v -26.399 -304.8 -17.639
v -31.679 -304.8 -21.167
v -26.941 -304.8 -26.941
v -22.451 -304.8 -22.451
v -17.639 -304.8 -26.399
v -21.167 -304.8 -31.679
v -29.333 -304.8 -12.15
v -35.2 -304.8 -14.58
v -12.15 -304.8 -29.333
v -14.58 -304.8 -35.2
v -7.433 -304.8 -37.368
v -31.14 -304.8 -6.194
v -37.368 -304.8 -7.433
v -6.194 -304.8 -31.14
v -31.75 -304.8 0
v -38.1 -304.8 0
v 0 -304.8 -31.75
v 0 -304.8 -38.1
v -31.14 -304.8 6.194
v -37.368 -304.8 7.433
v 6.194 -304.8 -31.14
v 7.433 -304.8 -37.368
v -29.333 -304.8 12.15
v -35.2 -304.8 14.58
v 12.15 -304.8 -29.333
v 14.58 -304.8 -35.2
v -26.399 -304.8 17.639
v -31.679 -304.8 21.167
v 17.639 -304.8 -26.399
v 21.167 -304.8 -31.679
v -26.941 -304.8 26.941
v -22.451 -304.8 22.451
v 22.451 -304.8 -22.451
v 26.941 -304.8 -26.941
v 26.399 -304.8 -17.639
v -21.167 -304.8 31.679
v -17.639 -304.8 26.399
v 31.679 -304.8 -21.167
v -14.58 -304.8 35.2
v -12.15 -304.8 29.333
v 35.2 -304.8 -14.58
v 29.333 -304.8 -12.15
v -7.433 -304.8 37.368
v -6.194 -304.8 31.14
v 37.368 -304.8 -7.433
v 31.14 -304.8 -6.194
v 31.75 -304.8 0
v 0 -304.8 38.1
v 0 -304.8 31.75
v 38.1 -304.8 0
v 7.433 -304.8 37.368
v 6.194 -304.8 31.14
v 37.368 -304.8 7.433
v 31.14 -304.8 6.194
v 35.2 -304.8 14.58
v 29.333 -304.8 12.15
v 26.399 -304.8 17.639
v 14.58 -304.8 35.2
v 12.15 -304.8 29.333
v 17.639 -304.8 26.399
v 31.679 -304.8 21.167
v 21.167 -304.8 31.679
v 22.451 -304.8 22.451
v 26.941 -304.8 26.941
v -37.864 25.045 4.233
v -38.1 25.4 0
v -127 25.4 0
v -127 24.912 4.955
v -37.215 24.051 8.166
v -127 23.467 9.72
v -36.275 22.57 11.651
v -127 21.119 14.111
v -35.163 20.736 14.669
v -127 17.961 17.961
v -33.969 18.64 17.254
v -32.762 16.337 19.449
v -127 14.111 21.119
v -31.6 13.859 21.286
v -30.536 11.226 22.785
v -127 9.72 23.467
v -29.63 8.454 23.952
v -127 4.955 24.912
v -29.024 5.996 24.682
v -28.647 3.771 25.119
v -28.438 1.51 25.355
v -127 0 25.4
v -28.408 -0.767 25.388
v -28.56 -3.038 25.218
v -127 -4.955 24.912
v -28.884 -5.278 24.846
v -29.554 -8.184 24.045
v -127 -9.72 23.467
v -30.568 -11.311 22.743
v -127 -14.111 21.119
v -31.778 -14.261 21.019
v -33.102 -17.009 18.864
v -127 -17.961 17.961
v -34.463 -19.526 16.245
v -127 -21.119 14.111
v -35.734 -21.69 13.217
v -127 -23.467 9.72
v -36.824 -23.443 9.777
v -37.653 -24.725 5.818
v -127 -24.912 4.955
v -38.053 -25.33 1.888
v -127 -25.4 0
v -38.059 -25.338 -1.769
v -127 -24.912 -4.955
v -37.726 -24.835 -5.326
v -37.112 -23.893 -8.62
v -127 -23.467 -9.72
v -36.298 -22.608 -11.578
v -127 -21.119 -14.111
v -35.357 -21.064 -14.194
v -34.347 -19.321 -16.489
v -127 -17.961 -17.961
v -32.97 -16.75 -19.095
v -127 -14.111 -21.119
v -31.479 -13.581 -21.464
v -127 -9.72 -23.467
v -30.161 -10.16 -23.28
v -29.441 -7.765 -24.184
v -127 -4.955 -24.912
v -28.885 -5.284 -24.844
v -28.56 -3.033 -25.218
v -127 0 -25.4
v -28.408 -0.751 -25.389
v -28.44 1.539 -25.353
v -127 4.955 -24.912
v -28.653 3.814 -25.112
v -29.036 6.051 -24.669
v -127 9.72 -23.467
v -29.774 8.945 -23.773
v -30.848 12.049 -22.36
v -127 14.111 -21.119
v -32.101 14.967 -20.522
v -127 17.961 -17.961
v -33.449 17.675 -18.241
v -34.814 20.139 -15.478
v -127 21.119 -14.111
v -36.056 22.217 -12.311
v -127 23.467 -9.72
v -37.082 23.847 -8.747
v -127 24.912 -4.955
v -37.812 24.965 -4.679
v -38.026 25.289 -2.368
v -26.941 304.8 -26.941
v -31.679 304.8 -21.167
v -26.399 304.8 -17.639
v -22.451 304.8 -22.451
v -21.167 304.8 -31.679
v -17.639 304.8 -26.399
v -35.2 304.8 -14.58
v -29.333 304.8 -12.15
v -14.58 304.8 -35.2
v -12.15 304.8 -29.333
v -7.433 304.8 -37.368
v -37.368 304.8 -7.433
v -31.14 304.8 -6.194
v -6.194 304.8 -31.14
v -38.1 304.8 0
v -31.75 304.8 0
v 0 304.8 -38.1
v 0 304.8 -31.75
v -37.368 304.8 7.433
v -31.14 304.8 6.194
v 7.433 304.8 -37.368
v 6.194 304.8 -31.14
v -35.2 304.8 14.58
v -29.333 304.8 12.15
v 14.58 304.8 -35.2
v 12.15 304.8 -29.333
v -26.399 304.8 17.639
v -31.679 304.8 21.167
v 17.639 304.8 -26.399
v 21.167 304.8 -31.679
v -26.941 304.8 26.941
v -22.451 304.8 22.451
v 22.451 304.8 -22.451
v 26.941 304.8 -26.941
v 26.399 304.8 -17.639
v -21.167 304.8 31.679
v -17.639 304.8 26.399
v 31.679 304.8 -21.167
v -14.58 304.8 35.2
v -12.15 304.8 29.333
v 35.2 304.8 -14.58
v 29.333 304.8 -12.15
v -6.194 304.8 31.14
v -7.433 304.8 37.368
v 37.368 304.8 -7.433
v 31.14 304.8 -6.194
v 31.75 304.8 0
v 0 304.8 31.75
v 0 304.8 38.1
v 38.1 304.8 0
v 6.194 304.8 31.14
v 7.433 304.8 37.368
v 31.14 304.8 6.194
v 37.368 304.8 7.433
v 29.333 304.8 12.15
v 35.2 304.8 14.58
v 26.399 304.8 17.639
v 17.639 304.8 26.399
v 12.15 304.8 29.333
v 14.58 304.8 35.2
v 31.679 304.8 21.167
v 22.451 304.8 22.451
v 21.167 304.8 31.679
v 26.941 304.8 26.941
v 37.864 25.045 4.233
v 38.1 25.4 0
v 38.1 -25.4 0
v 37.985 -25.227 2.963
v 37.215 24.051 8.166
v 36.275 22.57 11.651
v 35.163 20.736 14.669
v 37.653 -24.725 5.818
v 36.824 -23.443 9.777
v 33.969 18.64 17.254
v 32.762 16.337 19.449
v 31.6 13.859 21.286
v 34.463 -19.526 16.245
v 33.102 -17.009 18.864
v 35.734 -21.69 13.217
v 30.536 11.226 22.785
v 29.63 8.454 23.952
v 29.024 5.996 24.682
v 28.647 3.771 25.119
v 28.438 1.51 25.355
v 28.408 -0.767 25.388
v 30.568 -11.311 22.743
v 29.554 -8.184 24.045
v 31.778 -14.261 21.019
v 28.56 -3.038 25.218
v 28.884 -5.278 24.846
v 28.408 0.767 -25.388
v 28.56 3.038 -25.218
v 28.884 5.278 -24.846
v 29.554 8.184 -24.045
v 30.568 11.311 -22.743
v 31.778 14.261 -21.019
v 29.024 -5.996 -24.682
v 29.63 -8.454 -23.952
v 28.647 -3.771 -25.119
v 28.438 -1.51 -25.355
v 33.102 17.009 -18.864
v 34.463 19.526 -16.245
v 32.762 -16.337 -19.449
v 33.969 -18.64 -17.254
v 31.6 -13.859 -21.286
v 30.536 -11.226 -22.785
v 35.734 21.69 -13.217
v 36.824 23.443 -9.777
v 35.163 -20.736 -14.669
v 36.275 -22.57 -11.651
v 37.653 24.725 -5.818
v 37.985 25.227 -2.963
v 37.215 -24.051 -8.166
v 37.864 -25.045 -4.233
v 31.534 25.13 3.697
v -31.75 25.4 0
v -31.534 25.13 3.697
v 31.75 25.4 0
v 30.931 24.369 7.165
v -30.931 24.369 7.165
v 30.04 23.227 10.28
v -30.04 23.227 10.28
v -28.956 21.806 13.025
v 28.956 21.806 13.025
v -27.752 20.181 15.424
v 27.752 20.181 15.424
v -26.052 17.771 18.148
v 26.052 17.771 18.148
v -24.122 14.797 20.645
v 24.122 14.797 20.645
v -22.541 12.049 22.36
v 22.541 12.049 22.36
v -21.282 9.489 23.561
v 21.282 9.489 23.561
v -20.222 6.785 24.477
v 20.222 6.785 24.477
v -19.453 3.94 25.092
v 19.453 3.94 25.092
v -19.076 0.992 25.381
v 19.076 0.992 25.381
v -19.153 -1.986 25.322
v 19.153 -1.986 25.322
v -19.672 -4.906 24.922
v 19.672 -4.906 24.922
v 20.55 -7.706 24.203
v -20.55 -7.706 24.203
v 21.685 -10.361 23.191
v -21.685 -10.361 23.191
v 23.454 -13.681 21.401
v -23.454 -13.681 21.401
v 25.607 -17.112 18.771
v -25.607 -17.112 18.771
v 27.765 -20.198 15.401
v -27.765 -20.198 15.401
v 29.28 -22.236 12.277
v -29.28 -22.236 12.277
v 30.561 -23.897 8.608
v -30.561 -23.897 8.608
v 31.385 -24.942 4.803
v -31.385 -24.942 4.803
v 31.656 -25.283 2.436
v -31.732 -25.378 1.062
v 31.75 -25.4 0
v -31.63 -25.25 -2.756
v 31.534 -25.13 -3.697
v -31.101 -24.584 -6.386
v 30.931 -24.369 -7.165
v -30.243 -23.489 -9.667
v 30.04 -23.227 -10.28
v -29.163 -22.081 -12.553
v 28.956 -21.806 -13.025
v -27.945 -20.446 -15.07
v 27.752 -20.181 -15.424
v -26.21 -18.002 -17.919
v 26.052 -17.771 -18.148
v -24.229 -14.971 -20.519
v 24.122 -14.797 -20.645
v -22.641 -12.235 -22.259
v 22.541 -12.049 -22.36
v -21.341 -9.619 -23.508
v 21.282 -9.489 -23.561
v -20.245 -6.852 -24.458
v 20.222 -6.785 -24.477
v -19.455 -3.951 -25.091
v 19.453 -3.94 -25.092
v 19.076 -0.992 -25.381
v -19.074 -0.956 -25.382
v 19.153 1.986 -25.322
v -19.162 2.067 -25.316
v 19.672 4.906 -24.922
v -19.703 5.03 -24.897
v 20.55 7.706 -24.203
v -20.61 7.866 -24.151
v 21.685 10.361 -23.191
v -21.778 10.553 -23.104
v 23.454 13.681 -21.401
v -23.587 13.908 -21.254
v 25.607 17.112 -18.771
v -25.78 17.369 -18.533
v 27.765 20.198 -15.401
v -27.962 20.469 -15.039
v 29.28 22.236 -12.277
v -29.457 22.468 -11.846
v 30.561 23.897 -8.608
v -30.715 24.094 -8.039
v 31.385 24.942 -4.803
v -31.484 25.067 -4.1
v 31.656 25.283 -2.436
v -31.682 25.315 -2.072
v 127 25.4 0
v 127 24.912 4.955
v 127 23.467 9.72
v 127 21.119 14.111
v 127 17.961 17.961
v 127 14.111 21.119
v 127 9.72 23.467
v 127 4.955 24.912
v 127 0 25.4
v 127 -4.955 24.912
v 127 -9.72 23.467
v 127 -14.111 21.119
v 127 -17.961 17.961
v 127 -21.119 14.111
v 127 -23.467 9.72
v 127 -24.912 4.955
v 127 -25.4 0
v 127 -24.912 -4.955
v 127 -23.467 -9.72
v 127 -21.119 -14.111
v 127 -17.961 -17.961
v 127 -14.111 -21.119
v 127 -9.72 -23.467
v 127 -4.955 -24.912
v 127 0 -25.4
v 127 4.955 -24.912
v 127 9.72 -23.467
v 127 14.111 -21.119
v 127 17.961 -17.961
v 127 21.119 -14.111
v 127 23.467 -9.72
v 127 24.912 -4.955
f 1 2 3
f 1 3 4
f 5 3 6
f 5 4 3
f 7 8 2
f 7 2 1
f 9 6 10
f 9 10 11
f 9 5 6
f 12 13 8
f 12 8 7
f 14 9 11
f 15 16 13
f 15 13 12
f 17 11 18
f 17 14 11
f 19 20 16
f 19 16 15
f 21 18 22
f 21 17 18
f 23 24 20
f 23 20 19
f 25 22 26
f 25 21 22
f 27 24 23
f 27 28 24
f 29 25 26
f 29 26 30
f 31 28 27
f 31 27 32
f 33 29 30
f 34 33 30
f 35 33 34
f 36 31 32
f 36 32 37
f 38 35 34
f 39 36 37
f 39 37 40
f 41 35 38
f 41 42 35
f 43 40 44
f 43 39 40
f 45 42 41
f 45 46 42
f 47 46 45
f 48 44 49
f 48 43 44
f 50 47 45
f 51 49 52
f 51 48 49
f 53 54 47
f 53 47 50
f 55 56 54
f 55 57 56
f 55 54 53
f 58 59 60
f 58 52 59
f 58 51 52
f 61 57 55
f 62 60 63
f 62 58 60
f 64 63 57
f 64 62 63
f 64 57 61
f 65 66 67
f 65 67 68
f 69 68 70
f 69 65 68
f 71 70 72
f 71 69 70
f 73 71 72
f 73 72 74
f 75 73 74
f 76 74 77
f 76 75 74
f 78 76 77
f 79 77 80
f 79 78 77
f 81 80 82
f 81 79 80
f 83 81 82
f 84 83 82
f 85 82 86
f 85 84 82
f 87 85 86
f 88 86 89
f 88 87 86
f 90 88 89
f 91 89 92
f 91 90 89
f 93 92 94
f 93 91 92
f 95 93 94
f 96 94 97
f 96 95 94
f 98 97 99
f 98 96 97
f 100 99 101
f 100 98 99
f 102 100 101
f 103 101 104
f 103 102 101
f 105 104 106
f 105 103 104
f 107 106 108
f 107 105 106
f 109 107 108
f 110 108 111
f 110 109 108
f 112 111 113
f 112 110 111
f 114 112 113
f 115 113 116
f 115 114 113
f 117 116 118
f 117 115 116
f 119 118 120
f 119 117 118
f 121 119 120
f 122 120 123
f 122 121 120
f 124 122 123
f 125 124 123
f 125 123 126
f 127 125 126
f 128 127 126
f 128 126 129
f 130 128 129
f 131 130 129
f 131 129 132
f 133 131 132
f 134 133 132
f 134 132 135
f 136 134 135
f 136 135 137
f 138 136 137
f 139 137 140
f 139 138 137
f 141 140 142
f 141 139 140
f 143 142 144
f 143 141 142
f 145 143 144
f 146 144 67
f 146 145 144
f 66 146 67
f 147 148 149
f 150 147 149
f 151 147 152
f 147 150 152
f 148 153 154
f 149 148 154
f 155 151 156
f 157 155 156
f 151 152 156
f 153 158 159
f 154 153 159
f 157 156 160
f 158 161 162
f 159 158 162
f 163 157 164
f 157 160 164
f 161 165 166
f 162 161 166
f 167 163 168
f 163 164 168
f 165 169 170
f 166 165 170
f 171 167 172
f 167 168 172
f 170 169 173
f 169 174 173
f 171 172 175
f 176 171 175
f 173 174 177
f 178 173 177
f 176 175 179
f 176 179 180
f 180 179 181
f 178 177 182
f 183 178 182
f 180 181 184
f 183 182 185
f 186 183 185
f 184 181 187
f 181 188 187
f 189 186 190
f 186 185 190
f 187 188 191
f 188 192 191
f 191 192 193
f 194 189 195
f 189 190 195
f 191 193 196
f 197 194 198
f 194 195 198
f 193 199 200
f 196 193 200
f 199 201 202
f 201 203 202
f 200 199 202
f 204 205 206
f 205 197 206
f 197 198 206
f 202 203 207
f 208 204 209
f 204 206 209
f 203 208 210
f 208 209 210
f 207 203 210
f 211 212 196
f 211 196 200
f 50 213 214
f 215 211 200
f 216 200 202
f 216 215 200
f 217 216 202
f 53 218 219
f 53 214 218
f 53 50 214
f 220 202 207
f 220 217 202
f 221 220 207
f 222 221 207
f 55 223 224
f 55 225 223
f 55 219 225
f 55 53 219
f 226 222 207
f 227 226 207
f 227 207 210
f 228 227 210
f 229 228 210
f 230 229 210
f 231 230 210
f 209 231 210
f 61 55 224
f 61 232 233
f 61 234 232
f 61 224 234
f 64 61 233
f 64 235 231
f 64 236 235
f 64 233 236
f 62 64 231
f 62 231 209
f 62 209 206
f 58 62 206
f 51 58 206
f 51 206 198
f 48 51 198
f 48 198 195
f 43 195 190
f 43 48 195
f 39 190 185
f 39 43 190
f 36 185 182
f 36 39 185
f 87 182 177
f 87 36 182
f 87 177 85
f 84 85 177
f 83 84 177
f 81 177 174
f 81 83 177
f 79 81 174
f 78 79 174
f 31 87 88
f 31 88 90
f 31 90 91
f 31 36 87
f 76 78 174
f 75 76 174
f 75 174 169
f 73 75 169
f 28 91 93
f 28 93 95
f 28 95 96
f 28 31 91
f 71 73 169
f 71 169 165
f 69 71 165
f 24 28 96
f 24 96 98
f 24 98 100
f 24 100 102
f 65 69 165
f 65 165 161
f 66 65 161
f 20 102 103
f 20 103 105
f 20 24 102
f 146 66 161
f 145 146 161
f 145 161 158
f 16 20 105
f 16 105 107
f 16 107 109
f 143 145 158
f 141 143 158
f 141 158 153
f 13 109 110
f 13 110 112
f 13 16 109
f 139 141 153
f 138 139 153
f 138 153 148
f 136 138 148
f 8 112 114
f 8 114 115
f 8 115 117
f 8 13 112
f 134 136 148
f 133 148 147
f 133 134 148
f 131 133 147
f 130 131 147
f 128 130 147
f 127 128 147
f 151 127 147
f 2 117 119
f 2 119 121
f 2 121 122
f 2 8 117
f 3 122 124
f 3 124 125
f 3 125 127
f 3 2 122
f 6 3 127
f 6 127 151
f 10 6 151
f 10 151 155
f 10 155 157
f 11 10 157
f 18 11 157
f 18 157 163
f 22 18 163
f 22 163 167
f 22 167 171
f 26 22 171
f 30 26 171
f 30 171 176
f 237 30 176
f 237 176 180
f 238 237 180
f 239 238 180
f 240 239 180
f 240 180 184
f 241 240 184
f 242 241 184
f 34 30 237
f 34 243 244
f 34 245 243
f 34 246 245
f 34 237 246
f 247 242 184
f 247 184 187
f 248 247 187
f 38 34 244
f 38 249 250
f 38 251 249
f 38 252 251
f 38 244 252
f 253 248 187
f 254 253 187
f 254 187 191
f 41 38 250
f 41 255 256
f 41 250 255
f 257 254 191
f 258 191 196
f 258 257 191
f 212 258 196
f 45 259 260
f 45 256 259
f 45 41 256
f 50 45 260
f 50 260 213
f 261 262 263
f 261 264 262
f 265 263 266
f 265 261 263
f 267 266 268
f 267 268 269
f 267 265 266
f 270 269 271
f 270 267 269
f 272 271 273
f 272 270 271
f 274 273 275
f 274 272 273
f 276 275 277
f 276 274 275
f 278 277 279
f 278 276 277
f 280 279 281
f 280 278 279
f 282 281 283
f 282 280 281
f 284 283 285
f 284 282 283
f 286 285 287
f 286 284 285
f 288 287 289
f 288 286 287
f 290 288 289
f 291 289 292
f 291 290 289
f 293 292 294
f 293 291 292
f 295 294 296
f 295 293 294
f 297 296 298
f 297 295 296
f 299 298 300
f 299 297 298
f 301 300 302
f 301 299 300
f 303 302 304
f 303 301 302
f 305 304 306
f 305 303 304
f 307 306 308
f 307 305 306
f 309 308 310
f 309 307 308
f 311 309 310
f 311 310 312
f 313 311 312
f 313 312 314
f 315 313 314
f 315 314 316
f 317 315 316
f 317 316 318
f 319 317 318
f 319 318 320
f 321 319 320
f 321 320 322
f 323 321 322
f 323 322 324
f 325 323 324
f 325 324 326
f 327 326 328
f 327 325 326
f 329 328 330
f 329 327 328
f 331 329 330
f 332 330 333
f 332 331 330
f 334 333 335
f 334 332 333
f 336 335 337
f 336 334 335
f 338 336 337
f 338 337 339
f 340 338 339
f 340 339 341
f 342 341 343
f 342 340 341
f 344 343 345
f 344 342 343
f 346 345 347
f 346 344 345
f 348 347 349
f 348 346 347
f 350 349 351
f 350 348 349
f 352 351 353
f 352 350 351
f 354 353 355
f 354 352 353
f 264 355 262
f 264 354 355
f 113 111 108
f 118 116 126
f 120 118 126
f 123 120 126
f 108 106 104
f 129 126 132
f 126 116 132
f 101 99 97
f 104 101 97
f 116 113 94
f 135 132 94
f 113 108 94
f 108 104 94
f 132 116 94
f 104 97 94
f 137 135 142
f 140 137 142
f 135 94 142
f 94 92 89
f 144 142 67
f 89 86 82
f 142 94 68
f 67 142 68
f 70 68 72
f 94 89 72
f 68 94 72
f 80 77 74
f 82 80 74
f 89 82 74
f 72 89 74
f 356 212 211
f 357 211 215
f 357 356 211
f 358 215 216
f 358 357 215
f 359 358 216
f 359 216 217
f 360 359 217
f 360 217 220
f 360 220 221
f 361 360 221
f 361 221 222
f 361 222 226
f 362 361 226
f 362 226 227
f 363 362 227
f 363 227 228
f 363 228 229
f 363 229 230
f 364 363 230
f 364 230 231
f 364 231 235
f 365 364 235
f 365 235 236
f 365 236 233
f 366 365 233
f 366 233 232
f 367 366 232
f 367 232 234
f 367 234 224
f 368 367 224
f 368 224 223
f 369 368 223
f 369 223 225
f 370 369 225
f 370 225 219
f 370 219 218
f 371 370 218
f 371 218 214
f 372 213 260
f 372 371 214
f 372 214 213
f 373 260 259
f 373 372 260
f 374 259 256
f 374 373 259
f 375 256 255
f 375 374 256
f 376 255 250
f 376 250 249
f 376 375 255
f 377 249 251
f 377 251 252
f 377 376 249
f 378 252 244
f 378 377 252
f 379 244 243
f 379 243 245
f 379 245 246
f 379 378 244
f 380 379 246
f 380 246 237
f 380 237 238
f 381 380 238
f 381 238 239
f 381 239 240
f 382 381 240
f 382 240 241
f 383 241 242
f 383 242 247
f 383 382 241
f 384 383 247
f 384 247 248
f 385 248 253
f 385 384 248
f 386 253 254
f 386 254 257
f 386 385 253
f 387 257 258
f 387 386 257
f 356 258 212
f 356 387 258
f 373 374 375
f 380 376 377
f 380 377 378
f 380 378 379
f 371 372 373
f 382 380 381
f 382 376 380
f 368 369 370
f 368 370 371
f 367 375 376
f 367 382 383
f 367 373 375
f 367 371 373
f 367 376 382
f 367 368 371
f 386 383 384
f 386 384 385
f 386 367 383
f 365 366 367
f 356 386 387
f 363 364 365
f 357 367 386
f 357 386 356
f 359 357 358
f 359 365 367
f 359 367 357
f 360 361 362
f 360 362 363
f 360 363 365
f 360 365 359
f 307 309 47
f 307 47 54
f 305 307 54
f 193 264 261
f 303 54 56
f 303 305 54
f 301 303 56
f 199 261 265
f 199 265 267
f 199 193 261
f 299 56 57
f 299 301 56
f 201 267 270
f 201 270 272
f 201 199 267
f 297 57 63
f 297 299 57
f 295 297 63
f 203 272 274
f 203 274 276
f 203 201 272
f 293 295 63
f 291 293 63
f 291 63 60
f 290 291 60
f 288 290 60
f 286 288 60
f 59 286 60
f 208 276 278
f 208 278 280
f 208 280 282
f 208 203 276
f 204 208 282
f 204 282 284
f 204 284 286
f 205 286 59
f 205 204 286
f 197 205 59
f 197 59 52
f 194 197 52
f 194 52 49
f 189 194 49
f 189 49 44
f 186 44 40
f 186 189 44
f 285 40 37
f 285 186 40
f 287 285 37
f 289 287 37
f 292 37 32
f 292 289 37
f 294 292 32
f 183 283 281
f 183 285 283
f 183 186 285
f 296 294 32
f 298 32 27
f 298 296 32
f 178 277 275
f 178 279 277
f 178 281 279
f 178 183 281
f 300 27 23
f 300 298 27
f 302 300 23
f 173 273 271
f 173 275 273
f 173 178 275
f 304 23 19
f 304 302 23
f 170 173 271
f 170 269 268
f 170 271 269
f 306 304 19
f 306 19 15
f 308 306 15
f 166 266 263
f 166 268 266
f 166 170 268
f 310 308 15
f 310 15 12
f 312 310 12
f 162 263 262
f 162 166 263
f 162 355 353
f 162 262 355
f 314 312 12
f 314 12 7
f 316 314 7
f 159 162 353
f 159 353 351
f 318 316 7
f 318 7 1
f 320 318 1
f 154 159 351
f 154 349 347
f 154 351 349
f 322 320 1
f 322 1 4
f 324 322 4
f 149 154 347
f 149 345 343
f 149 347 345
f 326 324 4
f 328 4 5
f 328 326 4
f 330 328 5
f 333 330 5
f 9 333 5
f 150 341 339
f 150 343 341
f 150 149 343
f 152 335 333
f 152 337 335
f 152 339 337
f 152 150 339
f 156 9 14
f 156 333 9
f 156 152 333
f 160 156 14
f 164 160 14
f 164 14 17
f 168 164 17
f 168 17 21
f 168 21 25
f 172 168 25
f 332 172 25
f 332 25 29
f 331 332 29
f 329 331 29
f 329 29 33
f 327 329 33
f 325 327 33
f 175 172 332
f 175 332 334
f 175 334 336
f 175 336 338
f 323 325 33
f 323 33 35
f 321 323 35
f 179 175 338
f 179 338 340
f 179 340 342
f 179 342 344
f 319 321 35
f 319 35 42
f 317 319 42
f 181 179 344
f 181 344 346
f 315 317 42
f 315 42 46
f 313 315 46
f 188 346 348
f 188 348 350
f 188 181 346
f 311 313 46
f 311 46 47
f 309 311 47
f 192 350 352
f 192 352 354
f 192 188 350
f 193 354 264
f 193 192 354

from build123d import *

# Parameters (mm, degrees)
F0_R     = 38.1
F0_R_2   = 31.75
F1_DEPTH = 304.8
F2_R     = 25.4
F3_DEPTH = 127


with BuildPart() as f1:
    # F0 (on Front) → F1 (new body, symmetric)
    with BuildSketch(Plane.XZ):
        Circle(F0_R)
        Circle(F0_R_2, mode=Mode.SUBTRACT)
    extrude(amount=F1_DEPTH, both=True)

    # F2 (on Right) → F3 (join, symmetric)
    with BuildSketch(Plane.YZ):
        Circle(F2_R)
    extrude(amount=F3_DEPTH, both=True)


solid = f1.part
